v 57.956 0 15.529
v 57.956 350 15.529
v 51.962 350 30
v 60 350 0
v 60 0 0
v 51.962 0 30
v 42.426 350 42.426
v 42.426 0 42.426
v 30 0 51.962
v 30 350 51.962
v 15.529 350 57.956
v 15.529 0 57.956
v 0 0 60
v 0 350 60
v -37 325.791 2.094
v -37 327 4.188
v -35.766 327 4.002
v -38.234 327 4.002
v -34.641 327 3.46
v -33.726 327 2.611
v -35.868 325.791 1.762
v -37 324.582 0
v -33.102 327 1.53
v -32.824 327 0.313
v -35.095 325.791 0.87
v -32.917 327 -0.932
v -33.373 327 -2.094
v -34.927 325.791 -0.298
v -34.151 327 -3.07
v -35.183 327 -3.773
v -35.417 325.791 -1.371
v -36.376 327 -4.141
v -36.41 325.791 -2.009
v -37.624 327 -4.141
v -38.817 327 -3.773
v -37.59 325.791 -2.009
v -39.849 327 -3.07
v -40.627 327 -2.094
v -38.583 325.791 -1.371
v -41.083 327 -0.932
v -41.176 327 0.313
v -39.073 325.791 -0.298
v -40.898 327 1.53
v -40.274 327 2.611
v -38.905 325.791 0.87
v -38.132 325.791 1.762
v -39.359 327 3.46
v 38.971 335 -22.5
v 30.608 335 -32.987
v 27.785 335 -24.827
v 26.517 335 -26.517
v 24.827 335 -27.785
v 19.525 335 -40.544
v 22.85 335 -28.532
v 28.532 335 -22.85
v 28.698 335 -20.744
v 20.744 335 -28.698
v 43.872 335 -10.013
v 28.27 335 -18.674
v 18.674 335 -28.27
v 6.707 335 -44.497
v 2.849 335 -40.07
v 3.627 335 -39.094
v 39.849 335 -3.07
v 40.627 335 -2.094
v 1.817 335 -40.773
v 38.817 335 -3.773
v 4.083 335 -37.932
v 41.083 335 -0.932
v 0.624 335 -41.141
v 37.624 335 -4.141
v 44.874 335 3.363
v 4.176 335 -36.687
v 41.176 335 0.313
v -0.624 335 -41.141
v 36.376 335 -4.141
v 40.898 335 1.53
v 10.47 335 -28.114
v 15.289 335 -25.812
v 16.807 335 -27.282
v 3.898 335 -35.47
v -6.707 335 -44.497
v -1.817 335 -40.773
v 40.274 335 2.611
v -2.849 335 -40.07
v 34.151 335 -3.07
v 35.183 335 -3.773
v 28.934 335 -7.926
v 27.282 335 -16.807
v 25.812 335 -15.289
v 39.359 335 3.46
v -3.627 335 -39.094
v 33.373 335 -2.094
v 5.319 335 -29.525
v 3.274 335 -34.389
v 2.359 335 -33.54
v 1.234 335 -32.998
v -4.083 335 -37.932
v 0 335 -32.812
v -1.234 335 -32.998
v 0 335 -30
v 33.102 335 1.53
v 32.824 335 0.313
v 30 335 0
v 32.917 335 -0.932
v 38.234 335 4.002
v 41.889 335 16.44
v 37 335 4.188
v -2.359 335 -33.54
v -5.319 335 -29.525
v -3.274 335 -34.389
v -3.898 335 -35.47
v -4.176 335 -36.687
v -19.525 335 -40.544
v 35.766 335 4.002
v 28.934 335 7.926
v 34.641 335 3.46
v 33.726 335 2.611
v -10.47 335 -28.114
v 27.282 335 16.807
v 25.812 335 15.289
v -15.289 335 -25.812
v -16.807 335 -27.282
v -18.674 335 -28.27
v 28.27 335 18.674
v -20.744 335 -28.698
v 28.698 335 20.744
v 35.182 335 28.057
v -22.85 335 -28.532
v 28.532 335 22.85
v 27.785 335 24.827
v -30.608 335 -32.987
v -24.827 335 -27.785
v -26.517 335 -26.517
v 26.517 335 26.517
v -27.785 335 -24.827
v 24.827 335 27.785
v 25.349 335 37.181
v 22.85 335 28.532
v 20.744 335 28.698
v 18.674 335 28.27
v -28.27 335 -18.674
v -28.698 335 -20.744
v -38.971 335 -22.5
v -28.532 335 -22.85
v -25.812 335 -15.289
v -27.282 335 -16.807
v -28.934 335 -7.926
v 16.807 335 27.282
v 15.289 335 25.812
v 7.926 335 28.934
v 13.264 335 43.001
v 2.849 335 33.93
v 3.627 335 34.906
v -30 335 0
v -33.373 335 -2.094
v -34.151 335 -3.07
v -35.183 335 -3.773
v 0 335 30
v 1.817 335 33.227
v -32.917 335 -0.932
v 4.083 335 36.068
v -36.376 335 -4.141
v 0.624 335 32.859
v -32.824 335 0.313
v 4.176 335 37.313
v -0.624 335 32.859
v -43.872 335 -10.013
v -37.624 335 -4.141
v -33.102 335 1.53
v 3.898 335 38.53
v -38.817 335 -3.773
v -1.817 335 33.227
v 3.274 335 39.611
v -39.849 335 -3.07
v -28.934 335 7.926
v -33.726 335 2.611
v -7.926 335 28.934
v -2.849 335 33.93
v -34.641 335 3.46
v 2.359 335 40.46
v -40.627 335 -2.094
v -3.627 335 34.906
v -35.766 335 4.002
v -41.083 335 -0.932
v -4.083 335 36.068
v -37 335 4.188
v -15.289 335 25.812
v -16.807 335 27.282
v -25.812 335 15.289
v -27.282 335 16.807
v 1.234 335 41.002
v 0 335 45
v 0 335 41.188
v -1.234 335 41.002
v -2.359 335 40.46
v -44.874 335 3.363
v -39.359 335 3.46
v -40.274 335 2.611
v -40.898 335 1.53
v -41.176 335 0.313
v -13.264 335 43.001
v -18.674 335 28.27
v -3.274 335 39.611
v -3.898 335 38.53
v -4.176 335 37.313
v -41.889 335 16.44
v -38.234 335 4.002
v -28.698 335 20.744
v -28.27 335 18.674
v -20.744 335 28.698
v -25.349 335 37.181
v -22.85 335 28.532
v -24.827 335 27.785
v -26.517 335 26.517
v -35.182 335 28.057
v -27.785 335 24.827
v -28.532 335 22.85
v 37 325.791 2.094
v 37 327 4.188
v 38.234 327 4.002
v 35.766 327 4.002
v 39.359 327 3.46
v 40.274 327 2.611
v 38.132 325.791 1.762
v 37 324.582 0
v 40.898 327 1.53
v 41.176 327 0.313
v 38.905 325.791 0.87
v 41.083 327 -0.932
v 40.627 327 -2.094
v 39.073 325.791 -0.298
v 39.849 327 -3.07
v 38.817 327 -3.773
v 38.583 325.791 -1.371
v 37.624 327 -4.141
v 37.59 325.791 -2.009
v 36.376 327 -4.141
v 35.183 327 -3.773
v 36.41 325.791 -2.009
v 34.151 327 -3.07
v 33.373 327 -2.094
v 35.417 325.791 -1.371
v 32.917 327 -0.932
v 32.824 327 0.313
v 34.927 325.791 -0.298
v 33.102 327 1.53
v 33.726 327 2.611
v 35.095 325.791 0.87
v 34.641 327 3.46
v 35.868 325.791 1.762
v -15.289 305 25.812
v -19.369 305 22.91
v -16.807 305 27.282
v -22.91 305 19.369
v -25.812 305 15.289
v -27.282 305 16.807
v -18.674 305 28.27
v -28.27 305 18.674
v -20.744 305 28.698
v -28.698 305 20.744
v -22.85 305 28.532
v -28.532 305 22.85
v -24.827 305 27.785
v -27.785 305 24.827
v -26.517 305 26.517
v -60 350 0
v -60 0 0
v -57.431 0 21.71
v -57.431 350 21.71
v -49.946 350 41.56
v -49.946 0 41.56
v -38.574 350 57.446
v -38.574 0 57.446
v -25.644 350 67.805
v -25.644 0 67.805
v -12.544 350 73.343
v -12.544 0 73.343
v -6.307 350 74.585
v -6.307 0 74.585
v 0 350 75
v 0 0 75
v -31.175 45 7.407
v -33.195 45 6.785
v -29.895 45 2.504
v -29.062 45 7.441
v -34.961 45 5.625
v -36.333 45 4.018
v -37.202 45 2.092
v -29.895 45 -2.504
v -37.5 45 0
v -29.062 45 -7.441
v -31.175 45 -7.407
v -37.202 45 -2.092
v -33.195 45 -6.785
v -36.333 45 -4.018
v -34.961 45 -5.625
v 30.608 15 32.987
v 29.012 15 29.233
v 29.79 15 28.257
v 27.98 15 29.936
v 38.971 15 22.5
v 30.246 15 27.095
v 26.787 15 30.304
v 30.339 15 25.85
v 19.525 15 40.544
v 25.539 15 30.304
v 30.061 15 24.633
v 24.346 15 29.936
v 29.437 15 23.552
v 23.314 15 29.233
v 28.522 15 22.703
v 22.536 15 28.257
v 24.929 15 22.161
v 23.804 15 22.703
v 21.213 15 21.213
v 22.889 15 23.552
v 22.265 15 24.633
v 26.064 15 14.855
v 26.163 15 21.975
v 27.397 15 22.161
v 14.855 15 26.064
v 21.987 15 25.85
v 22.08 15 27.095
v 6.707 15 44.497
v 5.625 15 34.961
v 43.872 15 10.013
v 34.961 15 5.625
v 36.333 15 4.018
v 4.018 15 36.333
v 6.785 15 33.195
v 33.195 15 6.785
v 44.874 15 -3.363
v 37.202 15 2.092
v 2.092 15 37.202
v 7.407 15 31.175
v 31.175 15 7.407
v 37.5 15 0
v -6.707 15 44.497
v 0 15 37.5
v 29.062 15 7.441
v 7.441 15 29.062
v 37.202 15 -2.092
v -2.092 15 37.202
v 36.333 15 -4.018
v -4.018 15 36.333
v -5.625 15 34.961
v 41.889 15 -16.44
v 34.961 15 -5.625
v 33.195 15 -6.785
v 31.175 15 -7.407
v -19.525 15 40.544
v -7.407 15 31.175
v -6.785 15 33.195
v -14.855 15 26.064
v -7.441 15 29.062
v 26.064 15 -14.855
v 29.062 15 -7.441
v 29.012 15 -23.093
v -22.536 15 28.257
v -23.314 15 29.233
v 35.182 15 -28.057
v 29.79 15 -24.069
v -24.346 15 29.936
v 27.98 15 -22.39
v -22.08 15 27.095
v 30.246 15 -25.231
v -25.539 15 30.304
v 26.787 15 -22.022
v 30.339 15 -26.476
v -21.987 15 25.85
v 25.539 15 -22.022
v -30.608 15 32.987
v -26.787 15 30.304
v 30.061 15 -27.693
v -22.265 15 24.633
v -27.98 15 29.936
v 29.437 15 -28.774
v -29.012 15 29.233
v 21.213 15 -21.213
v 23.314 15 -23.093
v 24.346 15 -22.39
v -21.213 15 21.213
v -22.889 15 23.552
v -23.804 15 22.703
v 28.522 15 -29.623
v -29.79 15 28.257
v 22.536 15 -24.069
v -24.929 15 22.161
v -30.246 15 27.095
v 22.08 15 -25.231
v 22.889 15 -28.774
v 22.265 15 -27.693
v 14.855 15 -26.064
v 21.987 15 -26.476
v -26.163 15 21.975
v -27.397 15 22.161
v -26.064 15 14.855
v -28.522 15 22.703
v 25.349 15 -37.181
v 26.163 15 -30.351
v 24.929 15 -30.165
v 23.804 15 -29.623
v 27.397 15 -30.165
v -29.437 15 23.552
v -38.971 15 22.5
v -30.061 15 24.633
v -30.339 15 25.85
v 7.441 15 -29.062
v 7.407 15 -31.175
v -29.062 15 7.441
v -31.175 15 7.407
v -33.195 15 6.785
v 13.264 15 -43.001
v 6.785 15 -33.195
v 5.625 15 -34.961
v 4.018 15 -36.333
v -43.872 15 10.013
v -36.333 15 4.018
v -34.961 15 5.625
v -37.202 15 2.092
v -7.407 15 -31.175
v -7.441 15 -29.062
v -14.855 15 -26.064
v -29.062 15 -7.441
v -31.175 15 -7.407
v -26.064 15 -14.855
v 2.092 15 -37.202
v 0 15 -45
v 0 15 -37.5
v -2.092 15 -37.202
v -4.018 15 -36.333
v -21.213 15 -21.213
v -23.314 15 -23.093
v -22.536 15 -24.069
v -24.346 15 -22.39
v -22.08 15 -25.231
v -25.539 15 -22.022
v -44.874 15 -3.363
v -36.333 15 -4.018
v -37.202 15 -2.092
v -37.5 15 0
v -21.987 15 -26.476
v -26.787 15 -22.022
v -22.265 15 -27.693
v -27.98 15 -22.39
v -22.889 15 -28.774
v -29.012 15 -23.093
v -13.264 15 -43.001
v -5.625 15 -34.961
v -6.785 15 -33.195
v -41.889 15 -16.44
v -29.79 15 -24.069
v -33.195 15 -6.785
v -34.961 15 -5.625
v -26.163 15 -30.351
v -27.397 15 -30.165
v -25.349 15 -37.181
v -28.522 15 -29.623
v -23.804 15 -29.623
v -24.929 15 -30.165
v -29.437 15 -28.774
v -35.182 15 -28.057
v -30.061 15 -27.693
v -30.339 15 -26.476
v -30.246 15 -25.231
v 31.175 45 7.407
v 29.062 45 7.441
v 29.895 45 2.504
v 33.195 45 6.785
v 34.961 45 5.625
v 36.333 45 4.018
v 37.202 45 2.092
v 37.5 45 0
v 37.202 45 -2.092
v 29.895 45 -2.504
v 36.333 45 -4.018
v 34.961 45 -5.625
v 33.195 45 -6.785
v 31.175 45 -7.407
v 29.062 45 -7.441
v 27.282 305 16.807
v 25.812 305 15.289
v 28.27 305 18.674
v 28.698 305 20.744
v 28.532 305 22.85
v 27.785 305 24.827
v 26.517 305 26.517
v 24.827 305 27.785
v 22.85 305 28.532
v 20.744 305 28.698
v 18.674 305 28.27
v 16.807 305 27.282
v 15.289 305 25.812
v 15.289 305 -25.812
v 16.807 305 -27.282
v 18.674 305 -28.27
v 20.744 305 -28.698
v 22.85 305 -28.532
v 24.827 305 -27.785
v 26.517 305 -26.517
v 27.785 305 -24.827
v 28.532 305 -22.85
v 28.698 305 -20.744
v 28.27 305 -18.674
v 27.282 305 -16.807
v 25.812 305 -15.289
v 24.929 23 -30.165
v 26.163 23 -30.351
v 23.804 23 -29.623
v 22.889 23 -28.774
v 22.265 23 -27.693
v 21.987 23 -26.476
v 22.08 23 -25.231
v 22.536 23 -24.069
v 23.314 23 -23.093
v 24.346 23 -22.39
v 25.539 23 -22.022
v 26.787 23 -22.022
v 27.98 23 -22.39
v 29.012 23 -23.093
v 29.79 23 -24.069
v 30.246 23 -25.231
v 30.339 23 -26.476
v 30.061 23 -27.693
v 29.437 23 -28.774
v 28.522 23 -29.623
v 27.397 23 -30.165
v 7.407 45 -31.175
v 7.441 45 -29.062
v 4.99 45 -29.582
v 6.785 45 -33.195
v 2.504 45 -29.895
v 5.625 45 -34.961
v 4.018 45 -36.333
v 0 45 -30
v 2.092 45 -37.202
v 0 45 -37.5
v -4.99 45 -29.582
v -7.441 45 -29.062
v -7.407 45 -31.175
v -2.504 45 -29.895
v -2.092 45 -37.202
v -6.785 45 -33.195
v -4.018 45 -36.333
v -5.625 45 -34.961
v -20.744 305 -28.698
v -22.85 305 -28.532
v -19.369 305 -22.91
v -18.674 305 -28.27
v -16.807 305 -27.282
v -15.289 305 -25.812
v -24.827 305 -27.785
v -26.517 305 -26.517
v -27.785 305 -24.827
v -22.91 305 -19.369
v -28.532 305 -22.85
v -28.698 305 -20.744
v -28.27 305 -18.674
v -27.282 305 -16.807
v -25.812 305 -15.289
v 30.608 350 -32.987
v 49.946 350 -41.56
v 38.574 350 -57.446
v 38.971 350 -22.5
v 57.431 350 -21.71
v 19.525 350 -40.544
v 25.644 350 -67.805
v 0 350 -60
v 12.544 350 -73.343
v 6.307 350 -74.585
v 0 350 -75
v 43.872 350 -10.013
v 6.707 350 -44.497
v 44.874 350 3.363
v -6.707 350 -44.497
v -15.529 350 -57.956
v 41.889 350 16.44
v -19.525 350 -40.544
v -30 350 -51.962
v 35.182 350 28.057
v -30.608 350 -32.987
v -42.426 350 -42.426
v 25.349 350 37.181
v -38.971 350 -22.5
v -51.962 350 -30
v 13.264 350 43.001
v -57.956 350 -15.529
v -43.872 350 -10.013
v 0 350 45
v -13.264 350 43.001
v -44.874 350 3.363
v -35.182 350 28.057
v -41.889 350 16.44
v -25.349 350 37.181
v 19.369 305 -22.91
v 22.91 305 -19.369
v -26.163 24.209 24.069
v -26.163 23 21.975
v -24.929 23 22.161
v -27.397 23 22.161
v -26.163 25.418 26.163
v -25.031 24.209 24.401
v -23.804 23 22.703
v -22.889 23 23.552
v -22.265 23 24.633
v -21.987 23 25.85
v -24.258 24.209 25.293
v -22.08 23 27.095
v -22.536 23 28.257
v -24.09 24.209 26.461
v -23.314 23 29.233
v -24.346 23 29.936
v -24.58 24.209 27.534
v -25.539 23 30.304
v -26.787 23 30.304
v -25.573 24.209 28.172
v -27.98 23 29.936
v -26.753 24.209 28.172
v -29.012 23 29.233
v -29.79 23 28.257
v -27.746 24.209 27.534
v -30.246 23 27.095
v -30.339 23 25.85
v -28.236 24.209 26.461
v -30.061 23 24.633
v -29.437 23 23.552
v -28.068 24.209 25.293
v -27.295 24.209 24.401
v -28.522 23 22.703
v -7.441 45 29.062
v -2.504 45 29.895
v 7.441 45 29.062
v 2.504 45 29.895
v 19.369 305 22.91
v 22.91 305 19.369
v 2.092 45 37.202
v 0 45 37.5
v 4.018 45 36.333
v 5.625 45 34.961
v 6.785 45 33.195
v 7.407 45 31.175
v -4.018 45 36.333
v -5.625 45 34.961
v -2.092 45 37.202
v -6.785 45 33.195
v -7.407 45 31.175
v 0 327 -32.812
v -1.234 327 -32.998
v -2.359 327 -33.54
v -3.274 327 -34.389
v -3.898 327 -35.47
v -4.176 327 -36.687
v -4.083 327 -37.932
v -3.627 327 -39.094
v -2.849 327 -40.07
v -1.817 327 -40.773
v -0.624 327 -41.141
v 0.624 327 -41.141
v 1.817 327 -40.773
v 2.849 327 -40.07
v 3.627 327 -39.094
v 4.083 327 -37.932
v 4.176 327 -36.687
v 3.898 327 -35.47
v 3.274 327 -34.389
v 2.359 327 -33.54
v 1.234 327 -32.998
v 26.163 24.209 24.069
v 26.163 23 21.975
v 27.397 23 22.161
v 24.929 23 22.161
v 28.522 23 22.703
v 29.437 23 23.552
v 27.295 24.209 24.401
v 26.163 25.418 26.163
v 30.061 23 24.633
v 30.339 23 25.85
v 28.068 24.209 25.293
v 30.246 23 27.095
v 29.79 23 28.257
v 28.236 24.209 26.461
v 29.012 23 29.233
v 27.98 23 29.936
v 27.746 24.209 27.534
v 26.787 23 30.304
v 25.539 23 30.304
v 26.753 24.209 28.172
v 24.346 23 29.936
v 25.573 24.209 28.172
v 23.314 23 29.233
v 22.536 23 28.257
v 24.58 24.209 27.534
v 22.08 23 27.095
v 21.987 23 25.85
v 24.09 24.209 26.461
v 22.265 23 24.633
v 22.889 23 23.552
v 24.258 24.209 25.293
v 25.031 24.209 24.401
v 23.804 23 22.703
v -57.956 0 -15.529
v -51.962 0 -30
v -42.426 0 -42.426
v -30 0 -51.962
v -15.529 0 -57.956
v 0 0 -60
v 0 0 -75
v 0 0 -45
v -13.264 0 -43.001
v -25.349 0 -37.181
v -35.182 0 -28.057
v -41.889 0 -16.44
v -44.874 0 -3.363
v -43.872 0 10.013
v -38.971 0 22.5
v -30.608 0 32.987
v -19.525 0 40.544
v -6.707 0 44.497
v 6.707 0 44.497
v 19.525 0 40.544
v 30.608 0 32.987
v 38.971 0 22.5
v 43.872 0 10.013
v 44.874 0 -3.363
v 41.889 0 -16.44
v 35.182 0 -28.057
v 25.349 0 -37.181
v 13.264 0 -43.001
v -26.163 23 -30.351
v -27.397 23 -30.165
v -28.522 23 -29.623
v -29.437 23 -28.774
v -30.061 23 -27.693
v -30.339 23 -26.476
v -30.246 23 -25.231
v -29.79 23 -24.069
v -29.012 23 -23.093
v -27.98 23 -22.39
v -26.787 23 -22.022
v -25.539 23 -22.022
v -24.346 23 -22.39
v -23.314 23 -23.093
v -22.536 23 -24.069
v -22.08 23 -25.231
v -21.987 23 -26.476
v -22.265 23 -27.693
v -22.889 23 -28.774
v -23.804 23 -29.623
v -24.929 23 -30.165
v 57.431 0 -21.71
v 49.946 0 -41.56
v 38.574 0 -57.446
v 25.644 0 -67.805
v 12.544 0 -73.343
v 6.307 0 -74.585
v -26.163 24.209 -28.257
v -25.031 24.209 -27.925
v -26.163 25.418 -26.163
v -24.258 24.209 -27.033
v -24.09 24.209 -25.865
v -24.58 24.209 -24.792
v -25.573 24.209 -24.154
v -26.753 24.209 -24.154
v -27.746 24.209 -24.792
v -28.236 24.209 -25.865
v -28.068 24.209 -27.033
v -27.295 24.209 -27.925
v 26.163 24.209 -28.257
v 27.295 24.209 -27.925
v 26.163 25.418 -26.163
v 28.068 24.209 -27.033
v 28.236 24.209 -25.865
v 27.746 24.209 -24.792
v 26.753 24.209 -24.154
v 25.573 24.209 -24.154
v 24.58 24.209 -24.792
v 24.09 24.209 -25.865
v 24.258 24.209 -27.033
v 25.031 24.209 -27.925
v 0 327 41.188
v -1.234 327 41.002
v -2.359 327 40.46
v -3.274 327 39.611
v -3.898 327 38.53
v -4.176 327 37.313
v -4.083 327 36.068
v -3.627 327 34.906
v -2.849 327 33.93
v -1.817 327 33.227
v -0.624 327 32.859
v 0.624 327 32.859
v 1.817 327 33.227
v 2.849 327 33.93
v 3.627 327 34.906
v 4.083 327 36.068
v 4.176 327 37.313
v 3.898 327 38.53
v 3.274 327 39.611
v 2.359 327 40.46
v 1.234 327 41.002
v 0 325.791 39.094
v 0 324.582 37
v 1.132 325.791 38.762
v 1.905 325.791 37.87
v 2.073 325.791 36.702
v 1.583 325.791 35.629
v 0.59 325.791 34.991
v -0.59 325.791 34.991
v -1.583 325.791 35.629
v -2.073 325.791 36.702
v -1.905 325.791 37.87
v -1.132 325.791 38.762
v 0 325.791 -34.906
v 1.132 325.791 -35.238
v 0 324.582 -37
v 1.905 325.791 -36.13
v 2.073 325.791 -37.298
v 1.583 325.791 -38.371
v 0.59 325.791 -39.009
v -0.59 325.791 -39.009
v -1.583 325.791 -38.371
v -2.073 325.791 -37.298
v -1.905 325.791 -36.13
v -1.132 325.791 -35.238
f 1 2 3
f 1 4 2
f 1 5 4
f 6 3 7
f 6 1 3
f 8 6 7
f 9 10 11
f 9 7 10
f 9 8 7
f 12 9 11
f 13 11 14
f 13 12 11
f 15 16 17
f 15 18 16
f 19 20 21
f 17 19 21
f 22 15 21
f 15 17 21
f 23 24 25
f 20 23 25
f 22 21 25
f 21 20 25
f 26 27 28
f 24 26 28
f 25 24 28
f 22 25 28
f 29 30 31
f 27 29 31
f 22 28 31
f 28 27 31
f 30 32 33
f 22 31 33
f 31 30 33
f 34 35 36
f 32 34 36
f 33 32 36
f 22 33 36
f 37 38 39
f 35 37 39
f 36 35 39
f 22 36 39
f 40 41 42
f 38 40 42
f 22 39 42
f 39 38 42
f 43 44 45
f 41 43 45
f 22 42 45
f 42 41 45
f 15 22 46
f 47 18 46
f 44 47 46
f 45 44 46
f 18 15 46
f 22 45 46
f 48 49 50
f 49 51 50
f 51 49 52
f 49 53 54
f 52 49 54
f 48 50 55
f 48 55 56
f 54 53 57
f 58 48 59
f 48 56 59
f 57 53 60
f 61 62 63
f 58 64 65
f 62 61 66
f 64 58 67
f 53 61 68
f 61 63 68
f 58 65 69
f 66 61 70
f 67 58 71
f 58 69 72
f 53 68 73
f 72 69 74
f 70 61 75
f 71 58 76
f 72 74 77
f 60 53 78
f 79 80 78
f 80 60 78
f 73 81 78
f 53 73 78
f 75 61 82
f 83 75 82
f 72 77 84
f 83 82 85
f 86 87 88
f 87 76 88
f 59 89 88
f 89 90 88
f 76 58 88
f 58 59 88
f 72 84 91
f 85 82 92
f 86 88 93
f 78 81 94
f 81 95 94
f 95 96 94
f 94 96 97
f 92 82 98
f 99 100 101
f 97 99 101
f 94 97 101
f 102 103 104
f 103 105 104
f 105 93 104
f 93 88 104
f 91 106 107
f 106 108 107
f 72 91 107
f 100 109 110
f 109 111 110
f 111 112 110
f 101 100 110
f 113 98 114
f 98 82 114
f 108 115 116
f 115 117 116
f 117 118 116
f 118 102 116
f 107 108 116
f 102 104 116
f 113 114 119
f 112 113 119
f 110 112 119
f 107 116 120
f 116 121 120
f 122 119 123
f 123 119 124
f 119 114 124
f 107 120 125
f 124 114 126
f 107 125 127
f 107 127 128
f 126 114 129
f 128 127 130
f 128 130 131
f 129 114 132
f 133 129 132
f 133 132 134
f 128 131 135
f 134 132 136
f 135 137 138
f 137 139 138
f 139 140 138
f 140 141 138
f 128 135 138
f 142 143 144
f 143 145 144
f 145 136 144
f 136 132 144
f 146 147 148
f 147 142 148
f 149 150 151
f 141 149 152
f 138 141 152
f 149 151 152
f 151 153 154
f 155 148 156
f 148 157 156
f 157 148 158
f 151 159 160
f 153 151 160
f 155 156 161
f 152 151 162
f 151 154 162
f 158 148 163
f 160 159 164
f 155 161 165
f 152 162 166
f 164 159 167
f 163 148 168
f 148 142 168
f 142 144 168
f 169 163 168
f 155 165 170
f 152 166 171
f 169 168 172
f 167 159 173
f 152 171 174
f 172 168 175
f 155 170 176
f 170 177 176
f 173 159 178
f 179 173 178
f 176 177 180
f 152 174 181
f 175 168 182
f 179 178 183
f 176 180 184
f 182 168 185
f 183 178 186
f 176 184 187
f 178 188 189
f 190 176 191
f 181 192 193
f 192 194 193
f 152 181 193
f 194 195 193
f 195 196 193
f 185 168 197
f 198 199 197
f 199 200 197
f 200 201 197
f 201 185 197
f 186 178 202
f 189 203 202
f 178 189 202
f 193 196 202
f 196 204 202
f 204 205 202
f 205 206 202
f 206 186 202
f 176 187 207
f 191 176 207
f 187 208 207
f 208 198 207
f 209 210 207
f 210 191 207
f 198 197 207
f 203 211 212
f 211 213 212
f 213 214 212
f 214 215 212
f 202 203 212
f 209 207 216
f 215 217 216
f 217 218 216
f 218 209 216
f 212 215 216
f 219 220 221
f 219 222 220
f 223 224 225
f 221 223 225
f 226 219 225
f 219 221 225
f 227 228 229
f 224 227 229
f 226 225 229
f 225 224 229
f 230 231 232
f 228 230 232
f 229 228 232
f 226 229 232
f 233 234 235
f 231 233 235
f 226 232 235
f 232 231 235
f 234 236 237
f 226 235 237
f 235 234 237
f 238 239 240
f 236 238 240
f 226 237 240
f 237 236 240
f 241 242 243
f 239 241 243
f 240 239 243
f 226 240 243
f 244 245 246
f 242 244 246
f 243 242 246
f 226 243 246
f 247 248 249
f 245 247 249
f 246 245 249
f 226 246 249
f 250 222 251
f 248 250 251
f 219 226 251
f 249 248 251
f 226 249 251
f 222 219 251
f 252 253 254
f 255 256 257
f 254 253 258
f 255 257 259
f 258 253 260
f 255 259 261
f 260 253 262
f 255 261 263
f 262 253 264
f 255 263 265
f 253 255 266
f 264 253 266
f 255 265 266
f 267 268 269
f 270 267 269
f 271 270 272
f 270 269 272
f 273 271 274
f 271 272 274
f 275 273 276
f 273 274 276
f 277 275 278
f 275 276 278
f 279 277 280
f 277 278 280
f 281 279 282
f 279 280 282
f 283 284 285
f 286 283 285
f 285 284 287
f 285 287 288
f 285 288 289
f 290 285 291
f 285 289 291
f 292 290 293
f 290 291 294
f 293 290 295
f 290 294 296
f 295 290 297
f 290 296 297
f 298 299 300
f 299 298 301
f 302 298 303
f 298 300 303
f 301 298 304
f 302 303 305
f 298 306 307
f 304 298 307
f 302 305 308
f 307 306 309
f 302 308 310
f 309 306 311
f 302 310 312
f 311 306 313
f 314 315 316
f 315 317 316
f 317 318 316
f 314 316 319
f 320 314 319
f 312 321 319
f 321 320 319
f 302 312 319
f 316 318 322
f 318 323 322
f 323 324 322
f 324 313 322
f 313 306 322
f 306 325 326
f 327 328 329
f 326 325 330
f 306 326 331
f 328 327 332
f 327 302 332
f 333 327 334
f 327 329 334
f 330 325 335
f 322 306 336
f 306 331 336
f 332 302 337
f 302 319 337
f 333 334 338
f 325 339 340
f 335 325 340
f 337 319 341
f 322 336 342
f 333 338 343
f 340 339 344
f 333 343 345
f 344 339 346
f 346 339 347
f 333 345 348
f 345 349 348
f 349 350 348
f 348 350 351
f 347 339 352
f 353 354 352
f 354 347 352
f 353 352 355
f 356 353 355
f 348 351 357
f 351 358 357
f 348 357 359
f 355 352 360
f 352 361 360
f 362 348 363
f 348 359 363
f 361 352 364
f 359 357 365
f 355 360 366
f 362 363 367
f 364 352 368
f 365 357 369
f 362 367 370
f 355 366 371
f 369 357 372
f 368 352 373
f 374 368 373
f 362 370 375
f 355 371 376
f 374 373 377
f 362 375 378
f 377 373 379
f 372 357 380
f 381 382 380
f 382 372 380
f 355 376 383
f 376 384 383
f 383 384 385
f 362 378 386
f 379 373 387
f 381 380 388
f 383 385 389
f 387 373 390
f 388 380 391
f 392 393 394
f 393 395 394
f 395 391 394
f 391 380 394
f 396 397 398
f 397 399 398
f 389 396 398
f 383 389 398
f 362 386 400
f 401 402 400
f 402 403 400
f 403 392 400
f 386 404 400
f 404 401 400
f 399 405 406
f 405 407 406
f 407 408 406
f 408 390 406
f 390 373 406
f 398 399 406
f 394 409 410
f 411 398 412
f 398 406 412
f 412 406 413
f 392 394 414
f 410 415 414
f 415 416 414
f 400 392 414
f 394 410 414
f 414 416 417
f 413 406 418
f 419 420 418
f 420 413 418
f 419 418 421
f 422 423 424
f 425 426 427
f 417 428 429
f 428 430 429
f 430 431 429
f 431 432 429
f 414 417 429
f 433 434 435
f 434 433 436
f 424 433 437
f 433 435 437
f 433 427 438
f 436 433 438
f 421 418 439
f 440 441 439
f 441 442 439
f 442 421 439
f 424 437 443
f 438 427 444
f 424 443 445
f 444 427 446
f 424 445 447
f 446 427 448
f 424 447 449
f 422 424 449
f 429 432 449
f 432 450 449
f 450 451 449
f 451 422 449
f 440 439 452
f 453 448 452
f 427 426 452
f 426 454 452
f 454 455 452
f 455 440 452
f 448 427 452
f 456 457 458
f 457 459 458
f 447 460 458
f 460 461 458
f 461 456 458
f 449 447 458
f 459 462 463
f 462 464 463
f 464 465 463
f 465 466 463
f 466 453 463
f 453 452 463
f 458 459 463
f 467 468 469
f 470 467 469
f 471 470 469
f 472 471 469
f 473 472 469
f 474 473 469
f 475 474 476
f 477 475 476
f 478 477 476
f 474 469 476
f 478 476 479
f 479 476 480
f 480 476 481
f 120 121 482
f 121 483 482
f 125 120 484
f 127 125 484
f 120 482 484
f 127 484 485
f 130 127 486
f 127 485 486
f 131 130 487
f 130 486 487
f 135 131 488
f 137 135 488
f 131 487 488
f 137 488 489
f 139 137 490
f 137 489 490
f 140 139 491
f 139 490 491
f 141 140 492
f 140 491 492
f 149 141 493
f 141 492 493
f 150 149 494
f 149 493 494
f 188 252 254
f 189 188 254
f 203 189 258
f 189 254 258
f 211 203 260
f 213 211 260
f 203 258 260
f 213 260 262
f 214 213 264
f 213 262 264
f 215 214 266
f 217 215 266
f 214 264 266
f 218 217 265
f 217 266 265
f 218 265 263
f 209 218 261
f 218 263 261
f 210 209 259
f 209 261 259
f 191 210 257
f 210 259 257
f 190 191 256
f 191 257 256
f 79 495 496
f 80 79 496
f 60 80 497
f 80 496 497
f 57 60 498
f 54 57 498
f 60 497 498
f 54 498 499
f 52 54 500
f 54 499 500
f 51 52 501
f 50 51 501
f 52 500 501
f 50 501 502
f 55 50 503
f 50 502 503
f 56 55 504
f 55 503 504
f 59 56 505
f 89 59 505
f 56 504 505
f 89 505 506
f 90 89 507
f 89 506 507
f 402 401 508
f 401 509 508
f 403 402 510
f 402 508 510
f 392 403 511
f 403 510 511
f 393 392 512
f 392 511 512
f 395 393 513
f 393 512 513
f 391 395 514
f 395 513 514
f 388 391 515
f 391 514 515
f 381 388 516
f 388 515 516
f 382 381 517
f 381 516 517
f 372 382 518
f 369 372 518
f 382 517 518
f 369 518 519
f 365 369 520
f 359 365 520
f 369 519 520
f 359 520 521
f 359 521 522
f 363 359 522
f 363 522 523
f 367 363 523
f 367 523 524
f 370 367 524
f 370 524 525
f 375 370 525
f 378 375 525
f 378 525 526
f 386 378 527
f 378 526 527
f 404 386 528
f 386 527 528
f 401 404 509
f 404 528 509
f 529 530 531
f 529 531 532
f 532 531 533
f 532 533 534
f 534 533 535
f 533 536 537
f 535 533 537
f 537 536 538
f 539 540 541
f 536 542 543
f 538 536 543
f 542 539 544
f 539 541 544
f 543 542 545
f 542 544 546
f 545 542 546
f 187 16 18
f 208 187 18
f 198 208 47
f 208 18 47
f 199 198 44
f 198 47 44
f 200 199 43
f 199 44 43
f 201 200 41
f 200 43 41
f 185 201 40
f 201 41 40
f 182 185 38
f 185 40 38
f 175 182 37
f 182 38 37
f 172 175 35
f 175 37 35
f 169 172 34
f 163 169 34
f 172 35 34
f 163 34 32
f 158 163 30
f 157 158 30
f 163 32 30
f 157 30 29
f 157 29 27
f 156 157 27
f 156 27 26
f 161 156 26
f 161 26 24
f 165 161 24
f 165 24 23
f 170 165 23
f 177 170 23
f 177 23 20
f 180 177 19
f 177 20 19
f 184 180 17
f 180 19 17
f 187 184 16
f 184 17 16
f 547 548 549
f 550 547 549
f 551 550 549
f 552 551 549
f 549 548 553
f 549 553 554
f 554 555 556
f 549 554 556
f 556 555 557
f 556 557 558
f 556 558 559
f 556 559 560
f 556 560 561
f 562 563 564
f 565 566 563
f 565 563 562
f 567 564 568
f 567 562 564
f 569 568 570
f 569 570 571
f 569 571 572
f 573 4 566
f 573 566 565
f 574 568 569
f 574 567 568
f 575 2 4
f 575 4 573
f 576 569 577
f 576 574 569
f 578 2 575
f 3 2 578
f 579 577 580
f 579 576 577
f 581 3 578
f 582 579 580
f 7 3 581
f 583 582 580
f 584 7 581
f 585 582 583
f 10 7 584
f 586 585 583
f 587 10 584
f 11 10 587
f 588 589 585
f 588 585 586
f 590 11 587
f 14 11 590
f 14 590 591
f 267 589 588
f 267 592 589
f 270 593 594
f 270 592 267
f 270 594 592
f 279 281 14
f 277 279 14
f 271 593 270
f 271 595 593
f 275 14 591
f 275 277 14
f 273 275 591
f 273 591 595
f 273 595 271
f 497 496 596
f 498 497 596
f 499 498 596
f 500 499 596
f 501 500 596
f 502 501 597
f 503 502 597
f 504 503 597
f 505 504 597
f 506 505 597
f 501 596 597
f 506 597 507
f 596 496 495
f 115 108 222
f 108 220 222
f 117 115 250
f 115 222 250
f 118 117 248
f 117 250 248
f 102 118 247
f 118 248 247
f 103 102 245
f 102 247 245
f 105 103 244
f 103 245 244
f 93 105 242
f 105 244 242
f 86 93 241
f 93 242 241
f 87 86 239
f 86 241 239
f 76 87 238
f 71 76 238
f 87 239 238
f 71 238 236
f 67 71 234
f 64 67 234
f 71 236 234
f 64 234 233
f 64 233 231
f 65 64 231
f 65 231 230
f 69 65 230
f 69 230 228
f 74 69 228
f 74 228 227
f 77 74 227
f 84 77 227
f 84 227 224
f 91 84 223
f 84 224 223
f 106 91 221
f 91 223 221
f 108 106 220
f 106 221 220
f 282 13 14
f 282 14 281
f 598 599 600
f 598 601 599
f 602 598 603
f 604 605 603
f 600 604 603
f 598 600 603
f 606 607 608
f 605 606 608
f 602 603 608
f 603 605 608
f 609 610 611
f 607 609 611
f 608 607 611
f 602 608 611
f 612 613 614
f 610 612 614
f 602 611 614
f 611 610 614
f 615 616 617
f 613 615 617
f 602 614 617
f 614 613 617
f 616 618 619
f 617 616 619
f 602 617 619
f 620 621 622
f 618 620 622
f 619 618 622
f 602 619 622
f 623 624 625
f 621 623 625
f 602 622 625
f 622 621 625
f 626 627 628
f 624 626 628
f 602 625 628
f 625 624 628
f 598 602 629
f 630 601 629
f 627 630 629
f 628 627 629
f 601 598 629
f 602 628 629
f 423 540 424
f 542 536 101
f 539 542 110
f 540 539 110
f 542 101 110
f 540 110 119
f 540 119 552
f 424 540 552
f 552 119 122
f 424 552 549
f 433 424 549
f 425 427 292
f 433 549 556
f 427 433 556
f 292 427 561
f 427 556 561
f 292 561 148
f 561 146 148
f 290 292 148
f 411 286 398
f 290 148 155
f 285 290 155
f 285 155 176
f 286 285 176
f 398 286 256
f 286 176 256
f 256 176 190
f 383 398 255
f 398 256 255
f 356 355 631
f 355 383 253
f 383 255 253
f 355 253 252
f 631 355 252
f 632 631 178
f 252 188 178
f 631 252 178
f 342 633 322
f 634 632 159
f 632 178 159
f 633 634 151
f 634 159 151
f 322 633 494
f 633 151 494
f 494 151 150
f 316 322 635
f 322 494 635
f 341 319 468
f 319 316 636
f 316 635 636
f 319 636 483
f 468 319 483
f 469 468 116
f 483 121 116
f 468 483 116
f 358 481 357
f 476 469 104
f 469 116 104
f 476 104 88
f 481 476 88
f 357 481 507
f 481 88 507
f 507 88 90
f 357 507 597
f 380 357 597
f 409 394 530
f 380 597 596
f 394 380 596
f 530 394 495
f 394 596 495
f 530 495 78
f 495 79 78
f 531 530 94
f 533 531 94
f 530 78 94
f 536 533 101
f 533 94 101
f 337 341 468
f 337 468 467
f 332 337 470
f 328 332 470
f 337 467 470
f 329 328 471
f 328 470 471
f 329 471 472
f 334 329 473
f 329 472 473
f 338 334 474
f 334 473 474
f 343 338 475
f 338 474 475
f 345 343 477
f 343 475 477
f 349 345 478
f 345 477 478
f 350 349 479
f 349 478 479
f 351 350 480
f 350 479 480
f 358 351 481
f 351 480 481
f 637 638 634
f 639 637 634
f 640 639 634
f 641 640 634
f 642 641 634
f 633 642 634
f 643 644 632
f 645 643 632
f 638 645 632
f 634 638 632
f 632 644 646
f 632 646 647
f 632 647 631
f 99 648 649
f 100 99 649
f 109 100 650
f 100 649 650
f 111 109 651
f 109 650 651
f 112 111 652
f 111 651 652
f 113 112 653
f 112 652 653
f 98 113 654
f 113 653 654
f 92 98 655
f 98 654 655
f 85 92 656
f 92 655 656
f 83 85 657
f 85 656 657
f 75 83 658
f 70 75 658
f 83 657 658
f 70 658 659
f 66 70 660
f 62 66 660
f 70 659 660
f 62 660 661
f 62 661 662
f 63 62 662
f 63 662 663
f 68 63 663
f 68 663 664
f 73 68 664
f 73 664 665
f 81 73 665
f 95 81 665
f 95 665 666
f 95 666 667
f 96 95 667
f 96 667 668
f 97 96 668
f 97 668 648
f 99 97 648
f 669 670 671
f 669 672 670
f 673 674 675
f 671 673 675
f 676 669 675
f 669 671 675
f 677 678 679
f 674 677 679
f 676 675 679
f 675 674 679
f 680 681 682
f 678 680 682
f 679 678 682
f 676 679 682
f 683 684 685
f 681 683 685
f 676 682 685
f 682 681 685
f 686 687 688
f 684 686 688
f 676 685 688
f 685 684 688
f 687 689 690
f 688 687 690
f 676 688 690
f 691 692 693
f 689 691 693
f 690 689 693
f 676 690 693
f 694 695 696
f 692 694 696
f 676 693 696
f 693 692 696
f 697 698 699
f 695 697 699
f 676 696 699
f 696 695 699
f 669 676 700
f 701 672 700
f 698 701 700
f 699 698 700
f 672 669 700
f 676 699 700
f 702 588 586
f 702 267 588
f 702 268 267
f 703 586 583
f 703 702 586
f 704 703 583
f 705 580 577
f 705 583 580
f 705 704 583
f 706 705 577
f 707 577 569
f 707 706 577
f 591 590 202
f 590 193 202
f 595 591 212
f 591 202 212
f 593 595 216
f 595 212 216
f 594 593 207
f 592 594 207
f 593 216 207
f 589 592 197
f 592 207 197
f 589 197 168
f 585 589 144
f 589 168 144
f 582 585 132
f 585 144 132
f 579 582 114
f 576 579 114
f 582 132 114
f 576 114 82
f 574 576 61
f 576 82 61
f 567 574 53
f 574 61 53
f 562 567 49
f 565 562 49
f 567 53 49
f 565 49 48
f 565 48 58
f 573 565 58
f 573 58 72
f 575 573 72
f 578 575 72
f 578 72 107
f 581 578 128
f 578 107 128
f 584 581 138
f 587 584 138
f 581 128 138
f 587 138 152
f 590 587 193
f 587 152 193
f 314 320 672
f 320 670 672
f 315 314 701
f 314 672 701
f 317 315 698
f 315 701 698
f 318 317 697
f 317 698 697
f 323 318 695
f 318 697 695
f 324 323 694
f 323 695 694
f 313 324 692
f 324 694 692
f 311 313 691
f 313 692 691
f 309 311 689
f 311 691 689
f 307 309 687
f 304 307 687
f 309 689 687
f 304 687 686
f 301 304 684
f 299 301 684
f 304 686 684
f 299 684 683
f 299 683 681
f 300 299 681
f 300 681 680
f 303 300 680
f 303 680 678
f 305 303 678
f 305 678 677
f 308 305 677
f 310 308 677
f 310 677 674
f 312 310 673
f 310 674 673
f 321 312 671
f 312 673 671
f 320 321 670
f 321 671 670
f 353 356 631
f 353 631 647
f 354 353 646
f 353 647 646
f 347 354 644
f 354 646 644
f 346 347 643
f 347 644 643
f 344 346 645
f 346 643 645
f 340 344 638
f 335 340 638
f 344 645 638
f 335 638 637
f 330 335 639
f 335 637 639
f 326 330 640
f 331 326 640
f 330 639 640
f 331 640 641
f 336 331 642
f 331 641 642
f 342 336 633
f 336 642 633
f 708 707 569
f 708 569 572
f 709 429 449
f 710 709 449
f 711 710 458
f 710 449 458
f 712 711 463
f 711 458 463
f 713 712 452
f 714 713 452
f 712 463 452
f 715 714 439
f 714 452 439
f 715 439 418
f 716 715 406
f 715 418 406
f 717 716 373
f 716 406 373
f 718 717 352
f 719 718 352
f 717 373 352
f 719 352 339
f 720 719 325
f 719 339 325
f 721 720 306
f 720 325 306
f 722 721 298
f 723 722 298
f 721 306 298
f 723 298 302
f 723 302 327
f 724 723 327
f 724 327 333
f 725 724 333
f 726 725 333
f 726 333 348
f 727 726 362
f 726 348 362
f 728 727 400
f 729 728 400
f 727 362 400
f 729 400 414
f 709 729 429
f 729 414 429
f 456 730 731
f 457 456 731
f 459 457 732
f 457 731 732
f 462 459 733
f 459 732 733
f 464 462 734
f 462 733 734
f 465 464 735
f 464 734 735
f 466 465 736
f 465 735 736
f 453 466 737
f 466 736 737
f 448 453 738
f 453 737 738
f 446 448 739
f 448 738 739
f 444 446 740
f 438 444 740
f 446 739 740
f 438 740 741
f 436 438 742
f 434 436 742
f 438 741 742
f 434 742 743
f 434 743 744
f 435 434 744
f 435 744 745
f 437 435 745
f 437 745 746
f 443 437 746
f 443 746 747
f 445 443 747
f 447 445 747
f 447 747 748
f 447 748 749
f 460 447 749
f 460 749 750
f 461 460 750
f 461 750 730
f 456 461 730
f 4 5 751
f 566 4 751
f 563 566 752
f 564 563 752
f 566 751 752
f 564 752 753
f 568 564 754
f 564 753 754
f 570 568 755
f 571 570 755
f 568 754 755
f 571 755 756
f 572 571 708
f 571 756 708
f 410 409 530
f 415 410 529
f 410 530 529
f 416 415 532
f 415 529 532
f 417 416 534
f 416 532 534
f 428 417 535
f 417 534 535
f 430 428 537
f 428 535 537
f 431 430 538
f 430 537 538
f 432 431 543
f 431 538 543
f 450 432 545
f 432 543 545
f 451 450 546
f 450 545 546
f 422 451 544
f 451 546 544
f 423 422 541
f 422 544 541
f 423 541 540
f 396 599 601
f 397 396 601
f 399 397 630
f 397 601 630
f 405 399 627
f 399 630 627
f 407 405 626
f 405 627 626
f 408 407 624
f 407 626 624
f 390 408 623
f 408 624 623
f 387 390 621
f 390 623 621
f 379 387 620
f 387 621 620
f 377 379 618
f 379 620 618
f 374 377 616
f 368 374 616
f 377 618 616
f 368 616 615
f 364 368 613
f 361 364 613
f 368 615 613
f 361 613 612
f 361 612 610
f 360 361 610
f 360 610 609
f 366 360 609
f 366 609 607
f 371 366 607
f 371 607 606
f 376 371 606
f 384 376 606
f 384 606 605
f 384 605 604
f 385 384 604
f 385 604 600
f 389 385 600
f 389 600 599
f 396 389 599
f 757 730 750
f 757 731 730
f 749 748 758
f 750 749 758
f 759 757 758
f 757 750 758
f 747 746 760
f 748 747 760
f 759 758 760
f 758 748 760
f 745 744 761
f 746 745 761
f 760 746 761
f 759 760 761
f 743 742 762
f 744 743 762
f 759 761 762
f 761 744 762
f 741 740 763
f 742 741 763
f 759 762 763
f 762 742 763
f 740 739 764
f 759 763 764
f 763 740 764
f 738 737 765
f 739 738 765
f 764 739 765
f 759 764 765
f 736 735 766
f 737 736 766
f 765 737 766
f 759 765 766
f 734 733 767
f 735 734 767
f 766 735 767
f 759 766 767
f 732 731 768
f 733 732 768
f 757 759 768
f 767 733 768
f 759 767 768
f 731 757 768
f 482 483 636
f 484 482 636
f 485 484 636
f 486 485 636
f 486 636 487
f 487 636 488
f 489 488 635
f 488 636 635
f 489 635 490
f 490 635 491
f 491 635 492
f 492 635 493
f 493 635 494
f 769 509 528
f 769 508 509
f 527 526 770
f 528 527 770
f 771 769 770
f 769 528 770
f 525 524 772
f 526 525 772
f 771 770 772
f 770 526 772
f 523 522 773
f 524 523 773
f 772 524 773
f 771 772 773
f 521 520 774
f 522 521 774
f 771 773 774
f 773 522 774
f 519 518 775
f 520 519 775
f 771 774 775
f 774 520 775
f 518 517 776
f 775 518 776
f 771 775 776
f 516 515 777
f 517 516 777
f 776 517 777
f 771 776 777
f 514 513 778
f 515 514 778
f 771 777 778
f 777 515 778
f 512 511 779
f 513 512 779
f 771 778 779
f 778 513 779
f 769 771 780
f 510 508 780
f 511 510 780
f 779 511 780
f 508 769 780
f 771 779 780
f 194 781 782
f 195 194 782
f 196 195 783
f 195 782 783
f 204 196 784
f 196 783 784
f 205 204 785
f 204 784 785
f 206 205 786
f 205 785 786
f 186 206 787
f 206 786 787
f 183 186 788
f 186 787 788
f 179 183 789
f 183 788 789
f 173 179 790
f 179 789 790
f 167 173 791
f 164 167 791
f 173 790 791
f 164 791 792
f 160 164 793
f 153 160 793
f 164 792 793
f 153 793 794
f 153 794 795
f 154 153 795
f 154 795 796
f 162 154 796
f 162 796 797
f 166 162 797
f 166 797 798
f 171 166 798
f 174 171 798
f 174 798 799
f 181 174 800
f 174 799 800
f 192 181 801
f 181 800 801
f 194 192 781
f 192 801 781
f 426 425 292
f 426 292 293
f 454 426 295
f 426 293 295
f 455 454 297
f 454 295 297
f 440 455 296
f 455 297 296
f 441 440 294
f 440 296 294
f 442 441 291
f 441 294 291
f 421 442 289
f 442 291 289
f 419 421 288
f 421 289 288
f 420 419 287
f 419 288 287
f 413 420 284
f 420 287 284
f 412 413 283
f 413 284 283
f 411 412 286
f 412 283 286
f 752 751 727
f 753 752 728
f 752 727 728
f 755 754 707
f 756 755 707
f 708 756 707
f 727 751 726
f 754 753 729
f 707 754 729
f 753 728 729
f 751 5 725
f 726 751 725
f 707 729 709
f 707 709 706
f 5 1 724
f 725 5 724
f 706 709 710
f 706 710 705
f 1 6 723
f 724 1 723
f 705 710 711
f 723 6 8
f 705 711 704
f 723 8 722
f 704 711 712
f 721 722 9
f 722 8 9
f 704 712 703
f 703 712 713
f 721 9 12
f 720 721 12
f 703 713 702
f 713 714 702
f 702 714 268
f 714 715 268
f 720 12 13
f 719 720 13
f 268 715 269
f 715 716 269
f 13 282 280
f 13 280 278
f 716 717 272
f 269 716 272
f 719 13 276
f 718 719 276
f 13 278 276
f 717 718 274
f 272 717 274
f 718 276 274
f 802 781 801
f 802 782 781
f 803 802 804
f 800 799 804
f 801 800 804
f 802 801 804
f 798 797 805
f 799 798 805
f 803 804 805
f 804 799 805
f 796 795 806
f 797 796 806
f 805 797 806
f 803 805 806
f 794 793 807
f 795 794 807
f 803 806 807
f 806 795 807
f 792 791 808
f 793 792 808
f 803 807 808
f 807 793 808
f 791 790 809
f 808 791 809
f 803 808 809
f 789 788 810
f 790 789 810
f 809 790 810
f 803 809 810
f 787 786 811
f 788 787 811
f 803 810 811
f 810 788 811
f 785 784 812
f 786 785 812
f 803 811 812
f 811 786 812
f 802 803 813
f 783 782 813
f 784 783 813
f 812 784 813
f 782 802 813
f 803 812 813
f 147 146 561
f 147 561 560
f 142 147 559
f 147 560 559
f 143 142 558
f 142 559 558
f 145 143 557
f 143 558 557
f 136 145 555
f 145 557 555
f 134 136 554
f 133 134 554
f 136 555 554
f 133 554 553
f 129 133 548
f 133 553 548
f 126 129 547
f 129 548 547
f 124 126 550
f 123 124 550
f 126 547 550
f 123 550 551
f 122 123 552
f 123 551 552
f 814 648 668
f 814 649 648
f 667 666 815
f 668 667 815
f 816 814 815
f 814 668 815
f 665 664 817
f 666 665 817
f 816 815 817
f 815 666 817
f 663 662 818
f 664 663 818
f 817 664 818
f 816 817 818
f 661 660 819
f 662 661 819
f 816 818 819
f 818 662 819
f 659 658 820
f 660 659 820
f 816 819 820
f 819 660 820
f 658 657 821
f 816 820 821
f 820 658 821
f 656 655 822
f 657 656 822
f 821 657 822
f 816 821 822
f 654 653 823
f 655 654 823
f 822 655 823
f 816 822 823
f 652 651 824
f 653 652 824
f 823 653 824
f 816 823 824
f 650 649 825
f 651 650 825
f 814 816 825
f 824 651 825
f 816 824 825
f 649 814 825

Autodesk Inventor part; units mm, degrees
ref_plane "YZ Plane" through (0, 0, 0) normal (1, 0, 0) x (0, 1, 0)
ref_plane "XZ Plane" through (0, 0, 0) normal (0, 1, 0) x (-1, 0, 0)
ref_plane "XY Plane" through (0, 0, 0) normal (0, 0, 1) x (1, 0, 0)
sketch "Эскиз1" plane through (0, 0, 0) normal (0, 1, 0) x (-1, 0, 0)
  line L0 (0, 60) -> (0, 75)
  line L1 (0, -60) -> (0, -75)
  ellipse E0 centre (0, 0) end of major axis (0, -75) minor radius 60 (60, 0) -> (0, 75) ccw
  ellipse E1 centre (0, 0) end of major axis (0, -75) minor radius 60 (-60, 0) -> (0, -75) ccw
  arc A0 (0, 60) -> (-60, 0) centre (0, 0) ccw
  arc A1 (0, -60) -> (60, 0) centre (0, 0) ccw
  circle A2 centre (0, 0) radius 30
  dimension "d1" = 75
  dimension "d2" = 75
  dimension "d5" = 60
extrude "Выдавливание1" add sketch "Эскиз1" along normal blind 350 contours L0 E0 A1 L1 E1 A0 | A2
sketch "Эскиз2" plane through (0, 0, 0) normal (0, -1, 0) x (1, 0, 0)
  ellipse E0 centre (0, 0) end of major axis (0, -75) minor radius 60 (0, 75) -> (-60, 0) ccw projected
  line L0 (0, 75) -> (0, 0)
  circle A0 centre (0, 0) radius 30
  line L1 (0, -75) -> (0, -60) projected
  line L2 (0, 0) -> (0, -75)
  line L3 (0, 0) -> (26.5165, -26.5165)
  line L4 (0, 0) -> (37.5, 0) construction
  line L5 (0, 0) -> (-26.5165, -26.5165)
  line L6 (0, 0) -> (37.5, 0) construction
  line L7 (0, 0) -> (-26.5165, 26.5165)
  line L8 (0, 0) -> (37.5, 0) construction
  line L9 (0, 0) -> (26.5165, 26.5165)
  line L10 (0, 0) -> (37.5, 0) construction
  circle A1 centre (26.5165, 26.5165) radius 5
  circle A2 centre (26.5165, -26.5165) radius 5
  circle A3 centre (-26.5165, 26.5165) radius 5
  circle A4 centre (-26.5165, -26.5165) radius 5
  circle A5 centre (0, 0) radius 45
  line L11 (0, 0) -> (30, 0)
  circle A6 centre (30, 0) radius 5
  line L12 (0, 0) -> (0, -30)
  circle A7 centre (0, -30) radius 5
  line L13 (0, 0) -> (-30, 0)
  circle A8 centre (-30, 0) radius 5
  line L14 (0, 0) -> (0, 30)
  circle A9 centre (0, 30) radius 5
  dimension "d13" = 60
  dimension "d14" = 37.5
  dimension "d15" = 45
  dimension "d16" = 37.5
  dimension "d17" = 135
  dimension "d18" = 37.5
  dimension "d19" = 135
  dimension "d20" = 37.5
  dimension "d21" = 45
  dimension "d22" = 10
  dimension "d23" = 10
  dimension "d24" = 10
  dimension "d25" = 10
  dimension "d26" = 90
  dimension "d30" = 30
  dimension "d31" = 30
  dimension "d32" = 30
  dimension "d33" = 30
hole "Отверстие1" at (0, 0, 0) direction (0, 1, 0) diameter 60 end through all counterbore diameter 90 counterbore depth 15
sketch "Эскиз3" plane through (0, 0, 0) normal (0, -1, 0) x (1, 0, 0)
  line L0 (0, 0) -> (30, 0)
  circle A0 centre (30, 0) radius 5
  line L1 (0, 0) -> (0, -30)
  circle A1 centre (0, 0) radius 30 projected
  circle A2 centre (0, -30) radius 5
  line L2 (0, 0) -> (-30, 0)
  line L3 (0, 0) -> (0, 30)
  circle A3 centre (0, 30) radius 5
  circle A4 centre (-30, 0) radius 5
  dimension "d34" = 30
  dimension "d35" = 10
  dimension "d36" = 10
  dimension "d37" = 10
  dimension "d38" = 10
hole "Отверстие2" at (0, 0, 30) at (-30, 0, 0) at (0, 0, -30) at (30, 0, 0) direction (0, 1, 0) diameter 15 depth 45
sketch "Эскиз5" plane through (0, 350, 0) normal (0, 1, 0) x (1, 0, 0)
  circle A0 centre (0, 0) radius 45
hole "Отверстие4" at (0, 350, 0) direction (0, -1, 0) diameter 90 depth 15
sketch "Эскиз6" plane through (0, 335, 0) normal (0, 1, 0) x (1, 0, 0)
  line L0 (0, 0) -> (0, -37.5)
  line L1 (0, 0) -> (-37.5, 0)
  line L2 (0, 0) -> (0, 37.5)
  line L3 (0, 0) -> (37.5, 0)
  line L4 (0, 0) -> (-21.2132, -21.2132)
  line L5 (0, 0) -> (30, 0) construction
  line L6 (0, 0) -> (21.2132, -21.2132)
  line L7 (0, 0) -> (30, 0) construction
  line L8 (0, 0) -> (-21.2132, 21.2132)
  line L9 (0, 0) -> (30, 0) construction
  line L10 (0, 0) -> (21.2132, 21.2132)
  line L11 (0, 0) -> (30, 0) construction
  circle A0 centre (21.2132, -21.2132) radius 7.5
  circle A1 centre (-21.2132, -21.2132) radius 7.5
  circle A2 centre (-21.2132, 21.2132) radius 7.5
  circle A3 centre (21.2132, 21.2132) radius 7.5
  circle A4 centre (37.5, 0) radius 5
  circle A5 centre (0, -37.5) radius 5
  circle A6 centre (-37.5, 0) radius 5
  circle A7 centre (0, 37.5) radius 5
  dimension "d71" = 37.5
  dimension "d72" = 37.5
  dimension "d73" = 37.5
  dimension "d74" = 37.5
  dimension "d75" = 30
  dimension "d76" = 135
  dimension "d77" = 30
  dimension "d78" = 45
  dimension "d79" = 30
  dimension "d80" = 135
  dimension "d81" = 30
  dimension "d82" = 45
  dimension "d83" = 15
  dimension "d84" = 15
  dimension "d85" = 15
  dimension "d86" = 15
  dimension "d87" = 10
  dimension "d88" = 10
  dimension "d89" = 10
  dimension "d90" = 10
hole "Отверстие5" at (21.2132, 335, 21.2132) at (-21.2132, 335, 21.2132) at (-21.2132, 335, -21.2132) at (21.2132, 335, -21.2132) direction (0, -1, 0) diameter 15 depth 30
sketch "Эскиз8" plane through (0, 335, 0) normal (0, 1, 0) x (1, 0, 0)
  point P0 (37, 0)
  point P1 (0, -37)
  point P2 (-37, 0)
  point P3 (0, 37)
hole "Отверстие7" at (37, 335, 0) at (0, 335, 37) at (-37, 335, 0) at (0, 335, -37) direction (0, -1, 0) diameter 8.376 depth 8 tip angle 120 thread size "M10x1.5" class "6H" standard "ISO Metric profile"
sketch "Эскиз9" plane through (0, 15, 0) normal (0, -1, 0) x (1, 0, 0)
  point P0 (26.163, 26.163)
  point P1 (26.163, -26.163)
  point P2 (-26.163, -26.163)
  point P3 (-26.163, 26.163)
hole "Отверстие8" at (26.163, 15, 26.163) at (26.163, 15, -26.163) at (-26.163, 15, -26.163) at (-26.163, 15, 26.163) direction (0, 1, 0) diameter 8.376 depth 8 tip angle 120 thread size "M10x1.5" class "6H" standard "ISO Metric profile"
properties material "Сталь, литейная"
